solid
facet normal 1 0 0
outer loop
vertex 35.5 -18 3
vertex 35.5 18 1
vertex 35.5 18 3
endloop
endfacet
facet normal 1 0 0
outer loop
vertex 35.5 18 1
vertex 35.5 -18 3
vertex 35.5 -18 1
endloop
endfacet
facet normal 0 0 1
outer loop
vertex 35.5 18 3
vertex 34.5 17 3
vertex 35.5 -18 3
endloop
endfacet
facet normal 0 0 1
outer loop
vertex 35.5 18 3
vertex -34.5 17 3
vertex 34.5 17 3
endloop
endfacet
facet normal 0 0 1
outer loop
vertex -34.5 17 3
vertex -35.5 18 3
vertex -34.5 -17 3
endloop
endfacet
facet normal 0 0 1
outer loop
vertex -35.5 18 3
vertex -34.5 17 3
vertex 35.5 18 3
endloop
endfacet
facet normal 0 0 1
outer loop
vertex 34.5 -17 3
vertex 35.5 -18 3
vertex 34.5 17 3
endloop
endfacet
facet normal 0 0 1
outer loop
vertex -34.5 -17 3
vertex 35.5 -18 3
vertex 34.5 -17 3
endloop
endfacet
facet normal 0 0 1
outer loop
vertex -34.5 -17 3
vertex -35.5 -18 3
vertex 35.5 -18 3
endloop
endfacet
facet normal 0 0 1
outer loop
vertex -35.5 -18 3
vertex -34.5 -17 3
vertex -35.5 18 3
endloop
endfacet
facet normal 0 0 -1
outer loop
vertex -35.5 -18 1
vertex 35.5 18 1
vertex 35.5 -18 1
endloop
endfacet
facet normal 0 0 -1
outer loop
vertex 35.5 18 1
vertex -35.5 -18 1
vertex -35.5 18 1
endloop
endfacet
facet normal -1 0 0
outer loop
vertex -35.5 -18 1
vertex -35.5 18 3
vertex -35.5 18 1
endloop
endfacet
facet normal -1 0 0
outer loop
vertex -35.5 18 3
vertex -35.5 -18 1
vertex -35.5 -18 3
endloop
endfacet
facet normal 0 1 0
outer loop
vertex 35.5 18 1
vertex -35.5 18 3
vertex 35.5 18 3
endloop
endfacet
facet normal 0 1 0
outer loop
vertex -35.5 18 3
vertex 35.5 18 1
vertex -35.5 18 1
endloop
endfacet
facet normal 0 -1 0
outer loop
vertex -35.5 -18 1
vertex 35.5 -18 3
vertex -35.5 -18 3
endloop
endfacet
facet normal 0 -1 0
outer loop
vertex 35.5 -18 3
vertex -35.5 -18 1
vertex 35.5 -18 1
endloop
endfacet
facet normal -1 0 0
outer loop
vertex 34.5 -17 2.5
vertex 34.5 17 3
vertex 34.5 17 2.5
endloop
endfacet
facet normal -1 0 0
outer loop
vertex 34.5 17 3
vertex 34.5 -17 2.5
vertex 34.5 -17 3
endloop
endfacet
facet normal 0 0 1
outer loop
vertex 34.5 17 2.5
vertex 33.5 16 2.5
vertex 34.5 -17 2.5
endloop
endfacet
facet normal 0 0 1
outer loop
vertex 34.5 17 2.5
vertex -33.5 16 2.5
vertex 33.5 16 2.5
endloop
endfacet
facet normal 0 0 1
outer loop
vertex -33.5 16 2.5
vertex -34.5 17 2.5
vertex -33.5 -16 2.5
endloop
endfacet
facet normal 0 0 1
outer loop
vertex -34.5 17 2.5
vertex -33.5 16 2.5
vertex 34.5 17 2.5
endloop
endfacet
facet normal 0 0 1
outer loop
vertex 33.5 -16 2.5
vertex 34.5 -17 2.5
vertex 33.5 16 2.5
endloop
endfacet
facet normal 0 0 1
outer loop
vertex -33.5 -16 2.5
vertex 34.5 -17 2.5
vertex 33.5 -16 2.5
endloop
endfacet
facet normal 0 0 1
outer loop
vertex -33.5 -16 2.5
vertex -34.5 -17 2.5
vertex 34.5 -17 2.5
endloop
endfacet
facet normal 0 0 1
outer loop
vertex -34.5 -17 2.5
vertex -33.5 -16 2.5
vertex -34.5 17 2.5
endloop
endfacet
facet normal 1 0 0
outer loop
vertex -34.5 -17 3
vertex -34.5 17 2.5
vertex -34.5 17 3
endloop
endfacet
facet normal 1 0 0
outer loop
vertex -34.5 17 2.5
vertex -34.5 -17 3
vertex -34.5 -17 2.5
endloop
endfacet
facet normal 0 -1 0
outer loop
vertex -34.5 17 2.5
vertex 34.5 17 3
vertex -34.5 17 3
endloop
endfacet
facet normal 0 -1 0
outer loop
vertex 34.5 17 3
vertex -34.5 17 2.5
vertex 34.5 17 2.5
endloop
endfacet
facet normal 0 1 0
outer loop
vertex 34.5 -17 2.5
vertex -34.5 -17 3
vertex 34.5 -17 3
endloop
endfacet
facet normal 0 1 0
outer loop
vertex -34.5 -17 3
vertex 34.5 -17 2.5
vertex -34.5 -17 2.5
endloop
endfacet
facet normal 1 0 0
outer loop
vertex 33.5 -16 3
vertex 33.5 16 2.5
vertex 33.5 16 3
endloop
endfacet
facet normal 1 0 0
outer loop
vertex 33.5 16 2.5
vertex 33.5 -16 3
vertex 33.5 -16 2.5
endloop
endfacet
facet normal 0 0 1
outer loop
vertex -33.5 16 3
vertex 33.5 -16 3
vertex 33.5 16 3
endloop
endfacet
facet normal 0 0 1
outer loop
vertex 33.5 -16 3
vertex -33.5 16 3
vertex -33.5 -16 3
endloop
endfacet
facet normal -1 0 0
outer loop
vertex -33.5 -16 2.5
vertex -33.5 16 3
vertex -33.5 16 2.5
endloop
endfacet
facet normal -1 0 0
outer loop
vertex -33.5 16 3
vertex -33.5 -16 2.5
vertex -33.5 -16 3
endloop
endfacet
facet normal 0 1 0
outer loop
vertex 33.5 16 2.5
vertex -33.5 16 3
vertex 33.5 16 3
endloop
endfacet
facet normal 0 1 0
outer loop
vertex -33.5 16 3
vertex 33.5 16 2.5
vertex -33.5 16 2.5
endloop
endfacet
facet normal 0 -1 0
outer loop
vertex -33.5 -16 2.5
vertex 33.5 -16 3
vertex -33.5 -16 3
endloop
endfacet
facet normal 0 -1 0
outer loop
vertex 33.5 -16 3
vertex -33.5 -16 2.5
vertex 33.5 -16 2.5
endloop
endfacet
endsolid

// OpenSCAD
translate([0,0,2]) 
{
    union()
    {
        cube([67,32,2], true);
        difference()
        {
            cube([71,36,2], true);
            translate([0,0,1])
                cube([69,34,1], true);
        }
    }
}

/*translate([0,0,2])
    cube([67,32,2], true);*/

/*
//Bottom
translate([0,0,2]) 
{
    difference()
    {
        cube([69,34,1], true);
        for (i=[-40:20:0])
        {
            echo(i);
            translate([i,0,0])
            {
                cube([12,25,2], true);
            }
            i = i + 20;
        }
    }
}

//Sides
translate([0,0,6]) 
{
    difference()
    {
        cube([69,34,8], true);
        cube([65,30,8], true);
        //Еdge
        translate([0,0,4])
            cube([67,32,2], true);
        //Place for the miniHDMI
        translate([-19.5,-15,4])
            cube([14,32,10], true);
        //Place for the 1st microUSB
        translate([21,-15,4])
            cube([9,32,10], true);
        //Place for the 2st microUSB
        translate([10,-15,4])
            cube([9,32,10], true);
        //microSD card
        translate([-33.5,2,4])
            cube([2,14,10], true);
        //Leave space for the camera
        translate([33,0,1])
            cube([1,20,10], true);
    }
}


//Holders
translate([30.5,14,3])
    cube([4,2,1.5], true);
translate([-30.5,14,3])
    cube([4,2,1.5], true);

translate([30.5,-14,3])
    cube([4,2,1.5], true);
translate([-30.5,-14,3])
    cube([4,2,1.5], true);
*/
